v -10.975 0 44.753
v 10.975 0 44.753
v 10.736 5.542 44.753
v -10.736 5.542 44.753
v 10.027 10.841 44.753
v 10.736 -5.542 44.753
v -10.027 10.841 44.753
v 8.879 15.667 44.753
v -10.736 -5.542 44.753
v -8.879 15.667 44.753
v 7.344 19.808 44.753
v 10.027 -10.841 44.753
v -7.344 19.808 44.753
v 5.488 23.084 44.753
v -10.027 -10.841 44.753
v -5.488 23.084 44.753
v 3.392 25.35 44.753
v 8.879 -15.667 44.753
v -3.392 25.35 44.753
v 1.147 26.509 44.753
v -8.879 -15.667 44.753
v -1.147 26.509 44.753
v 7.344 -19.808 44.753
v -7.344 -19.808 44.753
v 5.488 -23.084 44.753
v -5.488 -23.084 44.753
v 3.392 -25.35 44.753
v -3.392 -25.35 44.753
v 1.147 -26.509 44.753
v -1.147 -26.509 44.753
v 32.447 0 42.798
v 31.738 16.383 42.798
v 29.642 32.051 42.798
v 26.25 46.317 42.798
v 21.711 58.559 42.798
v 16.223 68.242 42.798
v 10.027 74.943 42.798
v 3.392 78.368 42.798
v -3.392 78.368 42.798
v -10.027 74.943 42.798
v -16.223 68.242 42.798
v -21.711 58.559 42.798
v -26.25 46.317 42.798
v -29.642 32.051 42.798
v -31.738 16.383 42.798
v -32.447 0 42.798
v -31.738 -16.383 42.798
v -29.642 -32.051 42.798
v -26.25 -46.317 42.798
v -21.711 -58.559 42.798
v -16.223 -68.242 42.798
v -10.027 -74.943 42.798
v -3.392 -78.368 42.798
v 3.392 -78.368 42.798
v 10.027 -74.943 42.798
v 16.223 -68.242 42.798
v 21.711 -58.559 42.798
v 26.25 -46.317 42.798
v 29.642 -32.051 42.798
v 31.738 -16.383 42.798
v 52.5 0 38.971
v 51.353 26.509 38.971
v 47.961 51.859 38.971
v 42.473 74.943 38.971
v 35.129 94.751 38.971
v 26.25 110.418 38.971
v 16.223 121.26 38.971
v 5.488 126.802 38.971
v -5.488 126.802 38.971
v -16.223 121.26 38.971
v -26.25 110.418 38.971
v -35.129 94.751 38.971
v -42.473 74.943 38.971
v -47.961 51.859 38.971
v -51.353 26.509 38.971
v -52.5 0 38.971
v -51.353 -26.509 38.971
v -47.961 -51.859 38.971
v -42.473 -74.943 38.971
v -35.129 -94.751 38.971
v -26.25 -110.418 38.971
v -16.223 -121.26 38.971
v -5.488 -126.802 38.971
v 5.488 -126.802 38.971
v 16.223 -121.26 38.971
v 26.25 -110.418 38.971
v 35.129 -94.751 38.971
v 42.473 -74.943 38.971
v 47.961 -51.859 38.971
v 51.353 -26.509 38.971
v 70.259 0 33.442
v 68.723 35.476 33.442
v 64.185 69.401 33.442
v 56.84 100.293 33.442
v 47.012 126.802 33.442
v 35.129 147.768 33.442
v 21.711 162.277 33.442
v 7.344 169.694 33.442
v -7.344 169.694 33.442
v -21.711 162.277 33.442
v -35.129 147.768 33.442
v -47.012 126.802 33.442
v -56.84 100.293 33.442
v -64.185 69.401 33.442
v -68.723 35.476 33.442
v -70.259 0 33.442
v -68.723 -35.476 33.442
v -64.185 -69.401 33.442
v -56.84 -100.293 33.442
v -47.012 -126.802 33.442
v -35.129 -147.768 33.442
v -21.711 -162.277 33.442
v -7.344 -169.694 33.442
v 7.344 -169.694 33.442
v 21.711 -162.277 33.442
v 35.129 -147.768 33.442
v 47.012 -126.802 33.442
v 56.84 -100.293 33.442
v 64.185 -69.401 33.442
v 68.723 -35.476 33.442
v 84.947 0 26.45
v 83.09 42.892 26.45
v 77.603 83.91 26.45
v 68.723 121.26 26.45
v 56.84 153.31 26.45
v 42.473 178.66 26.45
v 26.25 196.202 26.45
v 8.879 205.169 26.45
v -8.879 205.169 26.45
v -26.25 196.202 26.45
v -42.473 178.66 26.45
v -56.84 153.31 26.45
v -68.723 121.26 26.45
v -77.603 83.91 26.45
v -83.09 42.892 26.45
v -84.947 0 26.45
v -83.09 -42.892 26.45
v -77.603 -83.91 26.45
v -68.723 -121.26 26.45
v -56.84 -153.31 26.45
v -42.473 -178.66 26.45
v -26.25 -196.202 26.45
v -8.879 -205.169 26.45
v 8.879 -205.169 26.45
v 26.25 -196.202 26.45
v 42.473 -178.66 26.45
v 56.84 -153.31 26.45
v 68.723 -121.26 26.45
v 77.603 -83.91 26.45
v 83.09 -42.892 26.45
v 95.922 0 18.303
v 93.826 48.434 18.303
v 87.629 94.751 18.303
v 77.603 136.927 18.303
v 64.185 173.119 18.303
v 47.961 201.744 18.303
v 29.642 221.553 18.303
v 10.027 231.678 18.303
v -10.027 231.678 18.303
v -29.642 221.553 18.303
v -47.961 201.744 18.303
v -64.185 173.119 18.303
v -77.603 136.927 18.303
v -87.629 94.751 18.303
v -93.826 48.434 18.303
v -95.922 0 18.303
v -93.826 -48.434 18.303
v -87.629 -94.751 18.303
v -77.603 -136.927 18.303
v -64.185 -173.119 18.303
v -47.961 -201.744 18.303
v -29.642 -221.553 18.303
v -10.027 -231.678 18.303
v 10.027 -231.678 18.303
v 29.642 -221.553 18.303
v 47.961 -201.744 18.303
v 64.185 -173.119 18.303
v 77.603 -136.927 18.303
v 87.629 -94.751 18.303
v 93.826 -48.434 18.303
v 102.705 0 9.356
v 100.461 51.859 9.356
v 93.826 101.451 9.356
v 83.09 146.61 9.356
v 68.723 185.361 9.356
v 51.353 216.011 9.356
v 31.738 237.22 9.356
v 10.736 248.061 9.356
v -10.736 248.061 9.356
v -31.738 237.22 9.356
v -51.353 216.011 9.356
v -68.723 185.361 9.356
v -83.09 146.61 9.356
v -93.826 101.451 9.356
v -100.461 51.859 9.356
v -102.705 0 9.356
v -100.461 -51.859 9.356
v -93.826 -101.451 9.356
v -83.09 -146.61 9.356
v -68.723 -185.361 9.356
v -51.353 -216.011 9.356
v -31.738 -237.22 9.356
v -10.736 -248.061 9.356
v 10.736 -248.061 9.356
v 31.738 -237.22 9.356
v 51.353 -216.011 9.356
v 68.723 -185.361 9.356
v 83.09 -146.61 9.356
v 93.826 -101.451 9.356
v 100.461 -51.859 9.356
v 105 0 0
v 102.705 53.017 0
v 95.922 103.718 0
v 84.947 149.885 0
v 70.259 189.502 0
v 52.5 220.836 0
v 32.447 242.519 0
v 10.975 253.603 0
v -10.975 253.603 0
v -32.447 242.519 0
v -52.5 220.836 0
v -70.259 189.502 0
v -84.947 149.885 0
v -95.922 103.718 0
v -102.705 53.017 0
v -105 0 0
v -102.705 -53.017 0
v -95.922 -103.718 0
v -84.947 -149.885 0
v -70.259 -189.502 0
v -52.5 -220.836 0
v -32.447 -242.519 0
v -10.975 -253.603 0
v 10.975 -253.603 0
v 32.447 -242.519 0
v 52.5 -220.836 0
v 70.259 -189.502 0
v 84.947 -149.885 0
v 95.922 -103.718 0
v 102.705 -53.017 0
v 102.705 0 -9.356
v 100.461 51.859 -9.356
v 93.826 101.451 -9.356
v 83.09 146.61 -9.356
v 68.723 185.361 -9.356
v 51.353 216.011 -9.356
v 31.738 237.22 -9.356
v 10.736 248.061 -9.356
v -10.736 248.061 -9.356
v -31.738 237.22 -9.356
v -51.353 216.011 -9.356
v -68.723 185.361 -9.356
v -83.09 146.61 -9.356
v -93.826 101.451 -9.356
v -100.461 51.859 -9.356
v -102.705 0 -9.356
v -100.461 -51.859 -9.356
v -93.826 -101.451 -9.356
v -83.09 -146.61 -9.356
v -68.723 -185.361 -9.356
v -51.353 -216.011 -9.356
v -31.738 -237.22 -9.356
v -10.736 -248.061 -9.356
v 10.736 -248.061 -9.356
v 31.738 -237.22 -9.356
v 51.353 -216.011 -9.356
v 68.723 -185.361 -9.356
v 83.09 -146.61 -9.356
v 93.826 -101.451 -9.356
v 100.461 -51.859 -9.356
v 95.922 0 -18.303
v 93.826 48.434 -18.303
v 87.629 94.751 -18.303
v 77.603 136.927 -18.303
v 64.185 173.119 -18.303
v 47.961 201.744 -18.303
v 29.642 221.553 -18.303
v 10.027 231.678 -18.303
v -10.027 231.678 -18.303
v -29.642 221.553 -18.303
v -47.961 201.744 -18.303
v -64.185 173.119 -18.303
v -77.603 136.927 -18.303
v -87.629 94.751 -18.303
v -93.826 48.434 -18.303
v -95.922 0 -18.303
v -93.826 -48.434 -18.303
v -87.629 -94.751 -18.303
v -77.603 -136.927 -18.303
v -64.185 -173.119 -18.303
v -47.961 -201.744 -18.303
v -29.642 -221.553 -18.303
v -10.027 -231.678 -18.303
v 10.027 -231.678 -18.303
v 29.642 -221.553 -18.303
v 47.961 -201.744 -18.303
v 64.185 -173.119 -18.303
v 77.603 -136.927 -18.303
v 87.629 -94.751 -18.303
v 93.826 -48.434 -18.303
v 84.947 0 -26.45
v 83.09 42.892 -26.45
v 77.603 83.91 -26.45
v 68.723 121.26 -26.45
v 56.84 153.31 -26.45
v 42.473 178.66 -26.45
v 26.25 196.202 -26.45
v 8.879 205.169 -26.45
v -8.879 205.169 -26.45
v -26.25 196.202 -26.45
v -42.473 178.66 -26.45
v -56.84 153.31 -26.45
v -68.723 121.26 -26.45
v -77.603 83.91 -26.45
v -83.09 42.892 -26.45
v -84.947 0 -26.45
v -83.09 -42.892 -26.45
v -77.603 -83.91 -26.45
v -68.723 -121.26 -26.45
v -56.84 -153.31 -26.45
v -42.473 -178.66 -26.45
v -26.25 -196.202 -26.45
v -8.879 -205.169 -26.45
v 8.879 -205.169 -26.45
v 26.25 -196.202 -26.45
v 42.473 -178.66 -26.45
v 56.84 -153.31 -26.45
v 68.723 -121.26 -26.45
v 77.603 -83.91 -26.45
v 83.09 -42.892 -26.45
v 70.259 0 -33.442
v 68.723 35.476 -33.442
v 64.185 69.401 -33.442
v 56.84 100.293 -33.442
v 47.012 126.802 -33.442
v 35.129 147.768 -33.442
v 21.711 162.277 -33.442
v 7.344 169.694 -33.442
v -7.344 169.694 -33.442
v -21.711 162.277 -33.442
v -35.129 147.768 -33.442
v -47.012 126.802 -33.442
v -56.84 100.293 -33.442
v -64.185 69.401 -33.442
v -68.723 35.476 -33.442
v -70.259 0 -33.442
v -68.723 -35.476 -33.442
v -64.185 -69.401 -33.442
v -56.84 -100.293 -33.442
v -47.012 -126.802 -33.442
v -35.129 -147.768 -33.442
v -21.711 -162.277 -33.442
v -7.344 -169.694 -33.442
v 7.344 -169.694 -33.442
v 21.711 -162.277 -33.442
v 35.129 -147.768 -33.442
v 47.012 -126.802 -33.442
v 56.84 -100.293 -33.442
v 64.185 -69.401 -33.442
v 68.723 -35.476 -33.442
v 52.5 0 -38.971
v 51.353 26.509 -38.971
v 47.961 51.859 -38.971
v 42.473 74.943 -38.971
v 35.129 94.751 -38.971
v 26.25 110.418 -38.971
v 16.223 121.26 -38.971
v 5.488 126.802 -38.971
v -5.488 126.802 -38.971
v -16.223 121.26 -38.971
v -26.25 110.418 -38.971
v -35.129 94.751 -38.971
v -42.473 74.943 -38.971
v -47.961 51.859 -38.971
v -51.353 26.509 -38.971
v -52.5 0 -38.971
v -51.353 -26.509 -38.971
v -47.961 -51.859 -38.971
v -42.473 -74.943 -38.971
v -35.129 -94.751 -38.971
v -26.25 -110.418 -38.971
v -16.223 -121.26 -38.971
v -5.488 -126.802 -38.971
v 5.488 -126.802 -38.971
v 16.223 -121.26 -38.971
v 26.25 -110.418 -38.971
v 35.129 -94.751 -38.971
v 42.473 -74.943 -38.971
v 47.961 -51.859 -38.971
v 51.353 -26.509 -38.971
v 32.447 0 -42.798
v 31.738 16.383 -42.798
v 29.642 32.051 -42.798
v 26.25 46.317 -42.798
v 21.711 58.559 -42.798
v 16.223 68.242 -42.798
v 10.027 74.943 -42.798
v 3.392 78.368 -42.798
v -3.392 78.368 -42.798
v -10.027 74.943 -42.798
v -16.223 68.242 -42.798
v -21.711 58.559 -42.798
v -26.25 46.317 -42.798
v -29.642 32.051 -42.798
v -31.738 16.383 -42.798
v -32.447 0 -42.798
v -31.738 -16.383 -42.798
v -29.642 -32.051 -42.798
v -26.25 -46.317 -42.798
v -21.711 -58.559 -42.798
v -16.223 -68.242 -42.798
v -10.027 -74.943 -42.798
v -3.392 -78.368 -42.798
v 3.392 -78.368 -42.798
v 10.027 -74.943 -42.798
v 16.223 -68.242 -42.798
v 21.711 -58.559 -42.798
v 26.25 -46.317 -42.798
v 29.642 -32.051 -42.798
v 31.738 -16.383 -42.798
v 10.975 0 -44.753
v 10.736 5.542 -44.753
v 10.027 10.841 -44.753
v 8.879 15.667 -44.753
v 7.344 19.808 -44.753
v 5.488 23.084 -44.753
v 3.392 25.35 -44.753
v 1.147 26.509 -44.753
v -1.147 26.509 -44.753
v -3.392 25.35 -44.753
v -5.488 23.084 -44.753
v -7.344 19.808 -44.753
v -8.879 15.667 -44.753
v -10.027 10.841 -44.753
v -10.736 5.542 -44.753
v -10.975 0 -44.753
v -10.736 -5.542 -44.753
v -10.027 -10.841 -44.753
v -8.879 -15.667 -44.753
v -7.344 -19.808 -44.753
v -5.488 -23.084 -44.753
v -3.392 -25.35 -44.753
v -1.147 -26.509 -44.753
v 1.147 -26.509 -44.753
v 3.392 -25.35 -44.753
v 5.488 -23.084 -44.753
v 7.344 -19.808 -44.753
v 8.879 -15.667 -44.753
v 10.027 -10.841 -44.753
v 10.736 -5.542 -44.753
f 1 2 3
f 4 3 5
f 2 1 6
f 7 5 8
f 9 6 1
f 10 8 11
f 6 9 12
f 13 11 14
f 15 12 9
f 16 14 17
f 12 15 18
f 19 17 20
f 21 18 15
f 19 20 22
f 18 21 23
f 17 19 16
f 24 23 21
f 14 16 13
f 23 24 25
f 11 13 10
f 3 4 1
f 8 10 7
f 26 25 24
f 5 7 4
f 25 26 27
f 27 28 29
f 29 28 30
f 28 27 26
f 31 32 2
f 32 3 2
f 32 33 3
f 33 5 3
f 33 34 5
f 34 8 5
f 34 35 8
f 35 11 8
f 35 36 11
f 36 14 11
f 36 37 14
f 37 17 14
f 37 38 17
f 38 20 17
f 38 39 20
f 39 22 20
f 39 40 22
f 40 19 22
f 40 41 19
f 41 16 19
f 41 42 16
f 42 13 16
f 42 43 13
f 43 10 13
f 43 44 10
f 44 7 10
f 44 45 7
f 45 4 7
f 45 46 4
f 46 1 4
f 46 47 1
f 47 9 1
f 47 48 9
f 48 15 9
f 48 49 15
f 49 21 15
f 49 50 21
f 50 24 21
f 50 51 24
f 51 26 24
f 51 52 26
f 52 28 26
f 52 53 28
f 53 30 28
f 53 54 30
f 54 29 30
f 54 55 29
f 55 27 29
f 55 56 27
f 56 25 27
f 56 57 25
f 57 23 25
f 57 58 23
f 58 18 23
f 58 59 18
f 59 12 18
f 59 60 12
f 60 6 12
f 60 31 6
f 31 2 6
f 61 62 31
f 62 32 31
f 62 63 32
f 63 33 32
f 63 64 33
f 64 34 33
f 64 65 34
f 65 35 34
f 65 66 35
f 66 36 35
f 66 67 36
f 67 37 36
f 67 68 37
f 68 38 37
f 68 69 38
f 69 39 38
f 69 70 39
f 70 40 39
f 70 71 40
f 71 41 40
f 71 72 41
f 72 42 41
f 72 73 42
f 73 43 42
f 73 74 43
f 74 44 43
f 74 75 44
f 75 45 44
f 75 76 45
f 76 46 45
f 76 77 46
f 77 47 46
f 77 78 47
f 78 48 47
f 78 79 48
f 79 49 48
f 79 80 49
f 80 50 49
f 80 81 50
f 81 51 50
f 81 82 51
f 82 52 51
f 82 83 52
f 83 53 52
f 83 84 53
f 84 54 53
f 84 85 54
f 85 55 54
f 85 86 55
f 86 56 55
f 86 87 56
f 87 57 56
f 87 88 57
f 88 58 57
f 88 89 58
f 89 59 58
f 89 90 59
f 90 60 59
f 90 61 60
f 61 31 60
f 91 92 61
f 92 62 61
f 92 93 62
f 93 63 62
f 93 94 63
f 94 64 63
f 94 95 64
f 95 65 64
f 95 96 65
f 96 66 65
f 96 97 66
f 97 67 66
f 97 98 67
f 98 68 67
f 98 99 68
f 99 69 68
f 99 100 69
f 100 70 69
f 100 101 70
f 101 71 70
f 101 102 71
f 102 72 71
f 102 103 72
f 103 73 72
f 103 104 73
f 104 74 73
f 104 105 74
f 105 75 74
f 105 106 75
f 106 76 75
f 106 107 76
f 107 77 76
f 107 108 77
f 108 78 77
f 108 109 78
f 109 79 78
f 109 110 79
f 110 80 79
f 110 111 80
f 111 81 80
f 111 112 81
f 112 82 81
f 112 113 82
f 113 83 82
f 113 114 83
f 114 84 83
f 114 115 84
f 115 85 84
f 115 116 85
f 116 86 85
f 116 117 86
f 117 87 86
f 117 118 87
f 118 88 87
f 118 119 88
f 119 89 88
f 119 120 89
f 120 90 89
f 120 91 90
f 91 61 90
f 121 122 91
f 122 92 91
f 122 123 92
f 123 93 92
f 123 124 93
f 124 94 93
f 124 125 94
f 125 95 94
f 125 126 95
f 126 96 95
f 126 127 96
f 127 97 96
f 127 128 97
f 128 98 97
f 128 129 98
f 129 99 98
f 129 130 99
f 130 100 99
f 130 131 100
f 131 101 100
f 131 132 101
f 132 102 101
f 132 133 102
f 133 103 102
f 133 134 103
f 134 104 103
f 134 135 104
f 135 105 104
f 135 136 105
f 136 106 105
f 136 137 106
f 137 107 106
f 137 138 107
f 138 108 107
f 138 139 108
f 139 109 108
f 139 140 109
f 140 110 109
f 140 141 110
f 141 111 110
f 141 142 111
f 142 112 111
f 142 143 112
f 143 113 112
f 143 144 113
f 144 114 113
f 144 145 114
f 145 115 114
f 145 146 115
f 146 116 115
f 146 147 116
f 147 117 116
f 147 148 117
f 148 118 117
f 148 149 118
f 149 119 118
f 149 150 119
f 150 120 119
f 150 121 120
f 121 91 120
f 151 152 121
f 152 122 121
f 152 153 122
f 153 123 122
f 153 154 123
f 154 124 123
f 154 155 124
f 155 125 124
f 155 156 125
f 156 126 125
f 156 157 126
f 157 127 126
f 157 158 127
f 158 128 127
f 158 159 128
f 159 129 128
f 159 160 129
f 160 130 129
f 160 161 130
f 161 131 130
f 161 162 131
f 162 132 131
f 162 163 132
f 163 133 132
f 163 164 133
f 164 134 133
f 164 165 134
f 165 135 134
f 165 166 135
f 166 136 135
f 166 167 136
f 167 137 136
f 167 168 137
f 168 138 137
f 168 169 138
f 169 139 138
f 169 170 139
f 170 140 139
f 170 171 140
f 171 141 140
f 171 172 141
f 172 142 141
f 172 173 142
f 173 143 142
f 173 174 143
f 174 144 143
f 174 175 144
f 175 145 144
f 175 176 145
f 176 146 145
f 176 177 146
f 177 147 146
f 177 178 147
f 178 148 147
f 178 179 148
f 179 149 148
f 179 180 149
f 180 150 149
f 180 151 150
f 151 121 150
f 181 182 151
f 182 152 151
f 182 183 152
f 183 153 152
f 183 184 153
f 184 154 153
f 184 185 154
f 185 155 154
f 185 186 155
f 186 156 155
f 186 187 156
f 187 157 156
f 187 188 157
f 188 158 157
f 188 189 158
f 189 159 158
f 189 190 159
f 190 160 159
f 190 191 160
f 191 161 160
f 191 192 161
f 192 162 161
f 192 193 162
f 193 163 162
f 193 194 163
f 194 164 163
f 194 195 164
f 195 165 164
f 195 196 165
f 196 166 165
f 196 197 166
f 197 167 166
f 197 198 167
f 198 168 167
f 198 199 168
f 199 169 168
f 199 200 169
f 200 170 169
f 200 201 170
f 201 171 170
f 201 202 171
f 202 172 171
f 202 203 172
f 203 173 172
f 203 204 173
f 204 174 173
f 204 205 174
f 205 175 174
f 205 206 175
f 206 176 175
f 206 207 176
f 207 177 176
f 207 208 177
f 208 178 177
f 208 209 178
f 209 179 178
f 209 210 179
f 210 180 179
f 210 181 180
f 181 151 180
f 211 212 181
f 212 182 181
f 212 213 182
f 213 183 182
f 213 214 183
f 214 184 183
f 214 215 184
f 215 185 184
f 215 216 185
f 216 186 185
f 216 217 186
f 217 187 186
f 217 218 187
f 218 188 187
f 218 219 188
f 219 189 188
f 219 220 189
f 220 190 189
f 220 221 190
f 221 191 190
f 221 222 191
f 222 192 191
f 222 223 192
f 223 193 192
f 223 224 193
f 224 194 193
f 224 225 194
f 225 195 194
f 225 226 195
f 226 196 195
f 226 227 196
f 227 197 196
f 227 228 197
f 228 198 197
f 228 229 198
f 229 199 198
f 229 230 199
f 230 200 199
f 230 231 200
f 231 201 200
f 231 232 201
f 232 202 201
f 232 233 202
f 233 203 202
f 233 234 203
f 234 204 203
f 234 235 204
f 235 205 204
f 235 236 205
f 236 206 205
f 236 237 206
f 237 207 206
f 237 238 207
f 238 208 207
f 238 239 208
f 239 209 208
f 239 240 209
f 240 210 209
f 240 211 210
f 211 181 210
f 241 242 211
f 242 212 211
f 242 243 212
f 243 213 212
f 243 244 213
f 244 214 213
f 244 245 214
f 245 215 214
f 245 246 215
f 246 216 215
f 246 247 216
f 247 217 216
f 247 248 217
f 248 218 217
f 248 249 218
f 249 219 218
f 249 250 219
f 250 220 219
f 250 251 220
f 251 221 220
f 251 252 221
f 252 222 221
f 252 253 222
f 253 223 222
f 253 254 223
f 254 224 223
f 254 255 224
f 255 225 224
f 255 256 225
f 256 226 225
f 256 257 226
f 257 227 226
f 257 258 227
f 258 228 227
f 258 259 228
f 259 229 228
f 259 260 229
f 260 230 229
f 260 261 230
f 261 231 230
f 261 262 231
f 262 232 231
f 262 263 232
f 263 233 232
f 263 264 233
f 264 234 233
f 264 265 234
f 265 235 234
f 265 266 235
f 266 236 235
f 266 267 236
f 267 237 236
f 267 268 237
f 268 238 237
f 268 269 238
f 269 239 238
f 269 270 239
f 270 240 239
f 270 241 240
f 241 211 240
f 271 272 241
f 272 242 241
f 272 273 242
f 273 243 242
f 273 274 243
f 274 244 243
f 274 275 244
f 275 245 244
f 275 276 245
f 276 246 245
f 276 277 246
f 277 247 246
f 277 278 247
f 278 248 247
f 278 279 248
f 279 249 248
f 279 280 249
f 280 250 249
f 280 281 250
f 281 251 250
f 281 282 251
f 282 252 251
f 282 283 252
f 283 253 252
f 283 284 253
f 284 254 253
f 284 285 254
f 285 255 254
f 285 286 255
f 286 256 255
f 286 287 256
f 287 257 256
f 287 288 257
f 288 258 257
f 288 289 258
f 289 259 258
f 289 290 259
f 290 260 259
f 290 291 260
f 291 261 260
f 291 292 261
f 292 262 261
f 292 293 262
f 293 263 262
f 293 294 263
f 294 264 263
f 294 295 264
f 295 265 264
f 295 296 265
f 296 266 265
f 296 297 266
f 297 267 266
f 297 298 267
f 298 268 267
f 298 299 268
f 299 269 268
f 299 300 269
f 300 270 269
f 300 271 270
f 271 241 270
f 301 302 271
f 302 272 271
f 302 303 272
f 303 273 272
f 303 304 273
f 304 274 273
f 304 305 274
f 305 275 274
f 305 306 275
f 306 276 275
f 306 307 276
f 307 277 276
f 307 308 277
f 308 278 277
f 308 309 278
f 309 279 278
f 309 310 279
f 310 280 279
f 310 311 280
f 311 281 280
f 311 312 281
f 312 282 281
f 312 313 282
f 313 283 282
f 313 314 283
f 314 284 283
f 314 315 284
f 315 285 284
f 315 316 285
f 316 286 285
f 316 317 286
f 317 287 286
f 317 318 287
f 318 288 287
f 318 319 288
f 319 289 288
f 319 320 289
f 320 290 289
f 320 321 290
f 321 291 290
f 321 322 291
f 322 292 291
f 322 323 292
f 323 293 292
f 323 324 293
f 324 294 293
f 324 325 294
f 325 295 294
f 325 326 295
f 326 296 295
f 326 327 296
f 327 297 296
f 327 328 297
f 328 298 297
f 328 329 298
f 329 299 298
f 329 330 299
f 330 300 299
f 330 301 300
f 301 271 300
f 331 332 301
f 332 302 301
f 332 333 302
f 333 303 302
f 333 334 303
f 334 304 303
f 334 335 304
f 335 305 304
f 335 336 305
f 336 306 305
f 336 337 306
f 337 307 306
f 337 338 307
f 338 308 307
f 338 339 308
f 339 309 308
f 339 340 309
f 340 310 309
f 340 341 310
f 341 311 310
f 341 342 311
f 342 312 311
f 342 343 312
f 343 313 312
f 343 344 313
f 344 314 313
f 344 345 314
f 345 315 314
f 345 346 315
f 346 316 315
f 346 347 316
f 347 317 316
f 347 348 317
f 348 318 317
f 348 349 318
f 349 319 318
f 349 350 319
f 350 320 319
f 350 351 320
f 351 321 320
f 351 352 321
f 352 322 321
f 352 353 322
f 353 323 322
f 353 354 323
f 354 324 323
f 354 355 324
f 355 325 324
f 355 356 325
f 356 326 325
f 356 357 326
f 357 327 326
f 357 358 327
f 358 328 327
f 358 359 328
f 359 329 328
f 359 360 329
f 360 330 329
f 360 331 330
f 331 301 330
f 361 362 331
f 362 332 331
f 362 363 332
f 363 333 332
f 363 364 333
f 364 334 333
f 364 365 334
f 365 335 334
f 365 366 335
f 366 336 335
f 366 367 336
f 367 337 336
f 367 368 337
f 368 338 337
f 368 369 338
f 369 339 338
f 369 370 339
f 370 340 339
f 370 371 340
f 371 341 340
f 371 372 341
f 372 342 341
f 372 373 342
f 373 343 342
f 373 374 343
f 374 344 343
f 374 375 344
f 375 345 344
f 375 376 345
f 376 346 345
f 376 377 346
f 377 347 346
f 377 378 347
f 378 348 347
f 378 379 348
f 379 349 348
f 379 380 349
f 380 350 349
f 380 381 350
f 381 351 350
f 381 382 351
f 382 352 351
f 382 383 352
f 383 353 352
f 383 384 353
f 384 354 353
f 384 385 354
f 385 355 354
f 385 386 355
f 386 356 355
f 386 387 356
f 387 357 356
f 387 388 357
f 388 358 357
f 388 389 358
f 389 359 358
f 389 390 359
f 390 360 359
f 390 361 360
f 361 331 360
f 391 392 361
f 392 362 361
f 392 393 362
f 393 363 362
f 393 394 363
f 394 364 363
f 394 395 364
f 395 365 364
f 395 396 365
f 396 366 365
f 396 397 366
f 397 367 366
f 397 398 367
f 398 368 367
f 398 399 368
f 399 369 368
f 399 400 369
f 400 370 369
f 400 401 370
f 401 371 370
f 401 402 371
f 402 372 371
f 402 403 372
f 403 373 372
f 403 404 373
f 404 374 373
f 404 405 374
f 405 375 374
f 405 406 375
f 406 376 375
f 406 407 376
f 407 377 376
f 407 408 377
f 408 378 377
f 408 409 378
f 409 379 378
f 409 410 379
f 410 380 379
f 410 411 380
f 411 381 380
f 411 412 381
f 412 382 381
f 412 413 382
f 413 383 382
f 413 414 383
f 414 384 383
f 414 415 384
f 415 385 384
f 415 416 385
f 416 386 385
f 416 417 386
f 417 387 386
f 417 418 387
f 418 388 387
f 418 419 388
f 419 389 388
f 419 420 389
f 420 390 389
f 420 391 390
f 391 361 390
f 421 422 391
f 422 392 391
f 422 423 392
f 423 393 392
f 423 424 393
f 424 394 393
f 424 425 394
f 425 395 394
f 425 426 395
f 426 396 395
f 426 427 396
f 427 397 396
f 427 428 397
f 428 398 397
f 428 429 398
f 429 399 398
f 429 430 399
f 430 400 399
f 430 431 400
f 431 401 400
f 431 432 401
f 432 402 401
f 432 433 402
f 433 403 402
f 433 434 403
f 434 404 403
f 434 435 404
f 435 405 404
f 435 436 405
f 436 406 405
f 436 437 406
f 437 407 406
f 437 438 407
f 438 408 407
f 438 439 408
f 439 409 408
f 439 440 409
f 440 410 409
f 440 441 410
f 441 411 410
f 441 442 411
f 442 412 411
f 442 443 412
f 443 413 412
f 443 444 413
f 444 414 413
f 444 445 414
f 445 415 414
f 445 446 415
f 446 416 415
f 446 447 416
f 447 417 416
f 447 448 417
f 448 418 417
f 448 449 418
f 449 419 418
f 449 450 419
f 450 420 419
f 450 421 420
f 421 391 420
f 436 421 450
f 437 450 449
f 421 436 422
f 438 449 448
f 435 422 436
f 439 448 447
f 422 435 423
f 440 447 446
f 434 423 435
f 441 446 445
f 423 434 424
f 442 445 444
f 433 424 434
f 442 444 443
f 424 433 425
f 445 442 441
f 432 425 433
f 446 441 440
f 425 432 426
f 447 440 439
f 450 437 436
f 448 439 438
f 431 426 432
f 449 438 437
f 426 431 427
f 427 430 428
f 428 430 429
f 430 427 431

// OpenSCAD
// Generated by SolidPython 1.0.1 on 2020-07-29 00:46:48


scale(v = [7, 17, 3]) {
	sphere(r = 15);
}
/***********************************************
*********      SolidPython code:      **********
************************************************
 
# import packages: SolidPython
from solid import *
from solid.utils import *
from itertools import chain, combinations, permutations


class Resize:

    def __init__(self, scad_file):
        self.scad_file = scad_file
        #self.scad_file = import_scad(scad_file)
        # cone/cylinder param:
        self.r1 = 0
        self.r2 = 0
        self.h = 0
        # rectangular prism param:
        self.w = 0
        self.l = 0
        # ellipse param:
        self.r = 0

    # import OpenScad code (file name corresponds to shape)


    # classify shape + parameters
    def assign(self, param1, param2, param3):
        if self.scad_file == 'cone.scad':
            self.r1 = param1
            self.r2 = param2
            self.h = param3
        elif self.scad_file == 'cylinder.scad':
            self.r1 = param1
            self.r2 = param2
            self.h = param3
        elif self.scad_file == 'rectangularPrism.scad':
            self.h = param1
            self.l = param2
            self.w = param3
        else:
            self.r = param1
            self.h = param2

    # resize parameters
    def iterate(self):
        x = range(3, 20, 2)
        i = 1
        if self.scad_file == 'cone.scad':
            tempList = list(permutations(x, 2))
            for temp in tempList:
                param1 = temp[0]
                param2 = temp[1]
                filepath = 'produced_scad_files/' + 'cone' + str(param1) + '_' + str(param2) + '_' + '.scad'
                scad_render_to_file(cylinder(h=param1, r1=param2, r2=0), filepath)

        elif self.scad_file == 'cylinder.scad':
            tempList = list(permutations(x, 3))
            for temp in tempList:
                param1 = temp[0]
                param2 = temp[1]
                filepath = 'produced_scad_files/' + 'cylinder' + str(param1) + '_' + str(param2) + '_' + '.scad'
                scad_render_to_file(cylinder(h=param1, r1=param2, r2=param2), filepath)

        elif self.scad_file == 'rectangularPrism.scad':
            tempList = list(permutations(x, 3))
            for temp in tempList:
                param1 = temp[0]
                param2 = temp[1]
                param3 = temp[2]
                filepath = 'produced_scad_files/' + 'rectangularPrism' + str(param1) + '_' + str(param2) + '_' + str(
                    param3) + '.scad'
                scad_render_to_file(cube(size=(param1, param2, param3)), filepath)

        elif self.scad_file == 'ellipse.scad':
            tempList = list(permutations(x, 4))
            for temp in tempList:
                param1 = temp[0]
                param2 = temp[1]
                param3 = temp[2]
                param4 = temp[3]
                filepath = 'produced_scad_files/' + 'ellipse' + str(param1) + '_' + str(param2) + '_' + str(param3) + '_' + str(param4) + '.scad'
                scad_render_to_file(scale([param1, param2, param3])(sphere(r=param4)), filepath)

    def render_to_scadfile(self):
        scad_render_to_file(scad, 'example.scad') 
 
************************************************/
